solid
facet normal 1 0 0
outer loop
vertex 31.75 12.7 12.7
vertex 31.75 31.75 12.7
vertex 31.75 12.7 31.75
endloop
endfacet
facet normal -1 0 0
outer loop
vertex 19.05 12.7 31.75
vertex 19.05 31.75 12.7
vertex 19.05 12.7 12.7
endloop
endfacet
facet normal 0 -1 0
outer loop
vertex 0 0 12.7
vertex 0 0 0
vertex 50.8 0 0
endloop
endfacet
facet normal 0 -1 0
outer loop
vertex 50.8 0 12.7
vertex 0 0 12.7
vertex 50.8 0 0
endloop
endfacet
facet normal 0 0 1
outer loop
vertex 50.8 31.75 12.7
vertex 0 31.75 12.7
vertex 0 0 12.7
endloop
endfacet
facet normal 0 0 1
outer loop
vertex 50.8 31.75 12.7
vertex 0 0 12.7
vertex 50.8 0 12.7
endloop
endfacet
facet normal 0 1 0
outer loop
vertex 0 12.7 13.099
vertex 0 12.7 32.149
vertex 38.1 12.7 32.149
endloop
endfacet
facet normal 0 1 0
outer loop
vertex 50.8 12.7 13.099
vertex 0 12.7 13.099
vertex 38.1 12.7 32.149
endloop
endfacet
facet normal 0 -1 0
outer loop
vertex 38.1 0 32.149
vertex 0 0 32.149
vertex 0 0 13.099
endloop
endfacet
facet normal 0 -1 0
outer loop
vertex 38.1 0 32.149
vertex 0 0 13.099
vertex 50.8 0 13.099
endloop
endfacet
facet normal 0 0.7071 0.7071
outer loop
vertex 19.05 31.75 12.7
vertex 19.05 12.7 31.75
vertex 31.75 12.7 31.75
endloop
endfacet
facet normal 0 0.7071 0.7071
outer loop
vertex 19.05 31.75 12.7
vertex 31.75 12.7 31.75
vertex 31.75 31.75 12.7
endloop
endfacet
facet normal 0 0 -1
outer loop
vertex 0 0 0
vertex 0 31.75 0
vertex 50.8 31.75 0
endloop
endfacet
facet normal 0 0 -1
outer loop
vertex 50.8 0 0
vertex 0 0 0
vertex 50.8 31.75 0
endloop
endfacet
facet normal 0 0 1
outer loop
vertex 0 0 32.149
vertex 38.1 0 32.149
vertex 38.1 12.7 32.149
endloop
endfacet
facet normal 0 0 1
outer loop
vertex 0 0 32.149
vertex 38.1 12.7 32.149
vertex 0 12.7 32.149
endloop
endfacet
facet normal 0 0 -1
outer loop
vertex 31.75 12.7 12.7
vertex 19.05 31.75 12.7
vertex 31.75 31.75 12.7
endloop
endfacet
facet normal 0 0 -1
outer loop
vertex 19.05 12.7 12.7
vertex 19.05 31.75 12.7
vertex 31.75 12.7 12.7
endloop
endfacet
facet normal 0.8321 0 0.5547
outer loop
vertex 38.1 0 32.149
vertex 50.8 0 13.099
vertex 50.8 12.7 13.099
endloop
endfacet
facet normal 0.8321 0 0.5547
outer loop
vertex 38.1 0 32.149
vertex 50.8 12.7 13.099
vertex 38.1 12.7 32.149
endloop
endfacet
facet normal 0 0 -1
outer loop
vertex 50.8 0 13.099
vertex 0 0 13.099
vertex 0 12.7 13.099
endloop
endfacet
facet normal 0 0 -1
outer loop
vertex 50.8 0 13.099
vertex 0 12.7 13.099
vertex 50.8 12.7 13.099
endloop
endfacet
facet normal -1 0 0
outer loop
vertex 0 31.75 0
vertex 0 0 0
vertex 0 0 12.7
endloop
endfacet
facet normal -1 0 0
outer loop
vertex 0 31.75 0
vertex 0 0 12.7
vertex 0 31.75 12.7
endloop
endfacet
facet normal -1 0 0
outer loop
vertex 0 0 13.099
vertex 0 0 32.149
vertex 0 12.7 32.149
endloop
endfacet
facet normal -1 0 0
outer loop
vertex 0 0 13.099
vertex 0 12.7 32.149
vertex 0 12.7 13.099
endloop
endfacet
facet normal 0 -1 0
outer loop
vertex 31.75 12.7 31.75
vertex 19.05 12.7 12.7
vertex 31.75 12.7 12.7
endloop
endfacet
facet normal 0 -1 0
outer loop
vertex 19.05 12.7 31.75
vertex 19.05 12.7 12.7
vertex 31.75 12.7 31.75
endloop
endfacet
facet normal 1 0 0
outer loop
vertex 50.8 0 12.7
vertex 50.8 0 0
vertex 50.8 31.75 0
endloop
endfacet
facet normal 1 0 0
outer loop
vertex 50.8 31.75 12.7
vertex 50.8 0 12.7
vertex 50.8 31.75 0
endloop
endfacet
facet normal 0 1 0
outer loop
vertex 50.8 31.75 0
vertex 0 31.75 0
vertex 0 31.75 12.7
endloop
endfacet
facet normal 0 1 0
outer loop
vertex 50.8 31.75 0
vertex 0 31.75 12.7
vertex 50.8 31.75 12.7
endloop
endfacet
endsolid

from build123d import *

# Parameters (mm, degrees)
F0_W     = 50.8
F0_H     = 31.75
F1_DEPTH = 12.7
F3_DEPTH = 12.7
F5_DEPTH = 19.05
F6_DEPTH = 12.7


with BuildPart() as f1:
    # F0 (on Top) → F1 (new body)
    with BuildSketch(Plane.XY):
        with Locations((25.4, 15.875)):
            Rectangle(F0_W, F0_H)
    extrude(amount=F1_DEPTH)


with BuildPart() as f3:
    # F2 (on Front) → F3 (new body)
    with BuildSketch(Plane.XZ):
        Polygon((0, 32.1494329229), (0, 13.0994329229), (50.8, 13.0994329229), (38.1, 32.1494329229), align=None)
    extrude(amount=-F3_DEPTH)


with BuildPart() as f5:
    # F4 (on face) → F5 (new body)
    with BuildSketch(Plane(origin=(0, 0, 0), x_dir=(0, -1, 0), z_dir=(-1, 0, 0))):
        Polygon((-12.7, 31.75), (-31.75, 12.7), (-12.7, 12.7), align=None)
    extrude(amount=-F5_DEPTH)


with BuildPart() as f6:
    # F6 (new): a face of the model
    f6_faces = [f5.part.faces().sort_by_distance(p)[0] for p in [
        (19.05, 19.05, 19.05),
    ]]
    extrude(f6_faces, amount=F6_DEPTH)


solid = Compound([f1.part, f3.part, f6.part])
